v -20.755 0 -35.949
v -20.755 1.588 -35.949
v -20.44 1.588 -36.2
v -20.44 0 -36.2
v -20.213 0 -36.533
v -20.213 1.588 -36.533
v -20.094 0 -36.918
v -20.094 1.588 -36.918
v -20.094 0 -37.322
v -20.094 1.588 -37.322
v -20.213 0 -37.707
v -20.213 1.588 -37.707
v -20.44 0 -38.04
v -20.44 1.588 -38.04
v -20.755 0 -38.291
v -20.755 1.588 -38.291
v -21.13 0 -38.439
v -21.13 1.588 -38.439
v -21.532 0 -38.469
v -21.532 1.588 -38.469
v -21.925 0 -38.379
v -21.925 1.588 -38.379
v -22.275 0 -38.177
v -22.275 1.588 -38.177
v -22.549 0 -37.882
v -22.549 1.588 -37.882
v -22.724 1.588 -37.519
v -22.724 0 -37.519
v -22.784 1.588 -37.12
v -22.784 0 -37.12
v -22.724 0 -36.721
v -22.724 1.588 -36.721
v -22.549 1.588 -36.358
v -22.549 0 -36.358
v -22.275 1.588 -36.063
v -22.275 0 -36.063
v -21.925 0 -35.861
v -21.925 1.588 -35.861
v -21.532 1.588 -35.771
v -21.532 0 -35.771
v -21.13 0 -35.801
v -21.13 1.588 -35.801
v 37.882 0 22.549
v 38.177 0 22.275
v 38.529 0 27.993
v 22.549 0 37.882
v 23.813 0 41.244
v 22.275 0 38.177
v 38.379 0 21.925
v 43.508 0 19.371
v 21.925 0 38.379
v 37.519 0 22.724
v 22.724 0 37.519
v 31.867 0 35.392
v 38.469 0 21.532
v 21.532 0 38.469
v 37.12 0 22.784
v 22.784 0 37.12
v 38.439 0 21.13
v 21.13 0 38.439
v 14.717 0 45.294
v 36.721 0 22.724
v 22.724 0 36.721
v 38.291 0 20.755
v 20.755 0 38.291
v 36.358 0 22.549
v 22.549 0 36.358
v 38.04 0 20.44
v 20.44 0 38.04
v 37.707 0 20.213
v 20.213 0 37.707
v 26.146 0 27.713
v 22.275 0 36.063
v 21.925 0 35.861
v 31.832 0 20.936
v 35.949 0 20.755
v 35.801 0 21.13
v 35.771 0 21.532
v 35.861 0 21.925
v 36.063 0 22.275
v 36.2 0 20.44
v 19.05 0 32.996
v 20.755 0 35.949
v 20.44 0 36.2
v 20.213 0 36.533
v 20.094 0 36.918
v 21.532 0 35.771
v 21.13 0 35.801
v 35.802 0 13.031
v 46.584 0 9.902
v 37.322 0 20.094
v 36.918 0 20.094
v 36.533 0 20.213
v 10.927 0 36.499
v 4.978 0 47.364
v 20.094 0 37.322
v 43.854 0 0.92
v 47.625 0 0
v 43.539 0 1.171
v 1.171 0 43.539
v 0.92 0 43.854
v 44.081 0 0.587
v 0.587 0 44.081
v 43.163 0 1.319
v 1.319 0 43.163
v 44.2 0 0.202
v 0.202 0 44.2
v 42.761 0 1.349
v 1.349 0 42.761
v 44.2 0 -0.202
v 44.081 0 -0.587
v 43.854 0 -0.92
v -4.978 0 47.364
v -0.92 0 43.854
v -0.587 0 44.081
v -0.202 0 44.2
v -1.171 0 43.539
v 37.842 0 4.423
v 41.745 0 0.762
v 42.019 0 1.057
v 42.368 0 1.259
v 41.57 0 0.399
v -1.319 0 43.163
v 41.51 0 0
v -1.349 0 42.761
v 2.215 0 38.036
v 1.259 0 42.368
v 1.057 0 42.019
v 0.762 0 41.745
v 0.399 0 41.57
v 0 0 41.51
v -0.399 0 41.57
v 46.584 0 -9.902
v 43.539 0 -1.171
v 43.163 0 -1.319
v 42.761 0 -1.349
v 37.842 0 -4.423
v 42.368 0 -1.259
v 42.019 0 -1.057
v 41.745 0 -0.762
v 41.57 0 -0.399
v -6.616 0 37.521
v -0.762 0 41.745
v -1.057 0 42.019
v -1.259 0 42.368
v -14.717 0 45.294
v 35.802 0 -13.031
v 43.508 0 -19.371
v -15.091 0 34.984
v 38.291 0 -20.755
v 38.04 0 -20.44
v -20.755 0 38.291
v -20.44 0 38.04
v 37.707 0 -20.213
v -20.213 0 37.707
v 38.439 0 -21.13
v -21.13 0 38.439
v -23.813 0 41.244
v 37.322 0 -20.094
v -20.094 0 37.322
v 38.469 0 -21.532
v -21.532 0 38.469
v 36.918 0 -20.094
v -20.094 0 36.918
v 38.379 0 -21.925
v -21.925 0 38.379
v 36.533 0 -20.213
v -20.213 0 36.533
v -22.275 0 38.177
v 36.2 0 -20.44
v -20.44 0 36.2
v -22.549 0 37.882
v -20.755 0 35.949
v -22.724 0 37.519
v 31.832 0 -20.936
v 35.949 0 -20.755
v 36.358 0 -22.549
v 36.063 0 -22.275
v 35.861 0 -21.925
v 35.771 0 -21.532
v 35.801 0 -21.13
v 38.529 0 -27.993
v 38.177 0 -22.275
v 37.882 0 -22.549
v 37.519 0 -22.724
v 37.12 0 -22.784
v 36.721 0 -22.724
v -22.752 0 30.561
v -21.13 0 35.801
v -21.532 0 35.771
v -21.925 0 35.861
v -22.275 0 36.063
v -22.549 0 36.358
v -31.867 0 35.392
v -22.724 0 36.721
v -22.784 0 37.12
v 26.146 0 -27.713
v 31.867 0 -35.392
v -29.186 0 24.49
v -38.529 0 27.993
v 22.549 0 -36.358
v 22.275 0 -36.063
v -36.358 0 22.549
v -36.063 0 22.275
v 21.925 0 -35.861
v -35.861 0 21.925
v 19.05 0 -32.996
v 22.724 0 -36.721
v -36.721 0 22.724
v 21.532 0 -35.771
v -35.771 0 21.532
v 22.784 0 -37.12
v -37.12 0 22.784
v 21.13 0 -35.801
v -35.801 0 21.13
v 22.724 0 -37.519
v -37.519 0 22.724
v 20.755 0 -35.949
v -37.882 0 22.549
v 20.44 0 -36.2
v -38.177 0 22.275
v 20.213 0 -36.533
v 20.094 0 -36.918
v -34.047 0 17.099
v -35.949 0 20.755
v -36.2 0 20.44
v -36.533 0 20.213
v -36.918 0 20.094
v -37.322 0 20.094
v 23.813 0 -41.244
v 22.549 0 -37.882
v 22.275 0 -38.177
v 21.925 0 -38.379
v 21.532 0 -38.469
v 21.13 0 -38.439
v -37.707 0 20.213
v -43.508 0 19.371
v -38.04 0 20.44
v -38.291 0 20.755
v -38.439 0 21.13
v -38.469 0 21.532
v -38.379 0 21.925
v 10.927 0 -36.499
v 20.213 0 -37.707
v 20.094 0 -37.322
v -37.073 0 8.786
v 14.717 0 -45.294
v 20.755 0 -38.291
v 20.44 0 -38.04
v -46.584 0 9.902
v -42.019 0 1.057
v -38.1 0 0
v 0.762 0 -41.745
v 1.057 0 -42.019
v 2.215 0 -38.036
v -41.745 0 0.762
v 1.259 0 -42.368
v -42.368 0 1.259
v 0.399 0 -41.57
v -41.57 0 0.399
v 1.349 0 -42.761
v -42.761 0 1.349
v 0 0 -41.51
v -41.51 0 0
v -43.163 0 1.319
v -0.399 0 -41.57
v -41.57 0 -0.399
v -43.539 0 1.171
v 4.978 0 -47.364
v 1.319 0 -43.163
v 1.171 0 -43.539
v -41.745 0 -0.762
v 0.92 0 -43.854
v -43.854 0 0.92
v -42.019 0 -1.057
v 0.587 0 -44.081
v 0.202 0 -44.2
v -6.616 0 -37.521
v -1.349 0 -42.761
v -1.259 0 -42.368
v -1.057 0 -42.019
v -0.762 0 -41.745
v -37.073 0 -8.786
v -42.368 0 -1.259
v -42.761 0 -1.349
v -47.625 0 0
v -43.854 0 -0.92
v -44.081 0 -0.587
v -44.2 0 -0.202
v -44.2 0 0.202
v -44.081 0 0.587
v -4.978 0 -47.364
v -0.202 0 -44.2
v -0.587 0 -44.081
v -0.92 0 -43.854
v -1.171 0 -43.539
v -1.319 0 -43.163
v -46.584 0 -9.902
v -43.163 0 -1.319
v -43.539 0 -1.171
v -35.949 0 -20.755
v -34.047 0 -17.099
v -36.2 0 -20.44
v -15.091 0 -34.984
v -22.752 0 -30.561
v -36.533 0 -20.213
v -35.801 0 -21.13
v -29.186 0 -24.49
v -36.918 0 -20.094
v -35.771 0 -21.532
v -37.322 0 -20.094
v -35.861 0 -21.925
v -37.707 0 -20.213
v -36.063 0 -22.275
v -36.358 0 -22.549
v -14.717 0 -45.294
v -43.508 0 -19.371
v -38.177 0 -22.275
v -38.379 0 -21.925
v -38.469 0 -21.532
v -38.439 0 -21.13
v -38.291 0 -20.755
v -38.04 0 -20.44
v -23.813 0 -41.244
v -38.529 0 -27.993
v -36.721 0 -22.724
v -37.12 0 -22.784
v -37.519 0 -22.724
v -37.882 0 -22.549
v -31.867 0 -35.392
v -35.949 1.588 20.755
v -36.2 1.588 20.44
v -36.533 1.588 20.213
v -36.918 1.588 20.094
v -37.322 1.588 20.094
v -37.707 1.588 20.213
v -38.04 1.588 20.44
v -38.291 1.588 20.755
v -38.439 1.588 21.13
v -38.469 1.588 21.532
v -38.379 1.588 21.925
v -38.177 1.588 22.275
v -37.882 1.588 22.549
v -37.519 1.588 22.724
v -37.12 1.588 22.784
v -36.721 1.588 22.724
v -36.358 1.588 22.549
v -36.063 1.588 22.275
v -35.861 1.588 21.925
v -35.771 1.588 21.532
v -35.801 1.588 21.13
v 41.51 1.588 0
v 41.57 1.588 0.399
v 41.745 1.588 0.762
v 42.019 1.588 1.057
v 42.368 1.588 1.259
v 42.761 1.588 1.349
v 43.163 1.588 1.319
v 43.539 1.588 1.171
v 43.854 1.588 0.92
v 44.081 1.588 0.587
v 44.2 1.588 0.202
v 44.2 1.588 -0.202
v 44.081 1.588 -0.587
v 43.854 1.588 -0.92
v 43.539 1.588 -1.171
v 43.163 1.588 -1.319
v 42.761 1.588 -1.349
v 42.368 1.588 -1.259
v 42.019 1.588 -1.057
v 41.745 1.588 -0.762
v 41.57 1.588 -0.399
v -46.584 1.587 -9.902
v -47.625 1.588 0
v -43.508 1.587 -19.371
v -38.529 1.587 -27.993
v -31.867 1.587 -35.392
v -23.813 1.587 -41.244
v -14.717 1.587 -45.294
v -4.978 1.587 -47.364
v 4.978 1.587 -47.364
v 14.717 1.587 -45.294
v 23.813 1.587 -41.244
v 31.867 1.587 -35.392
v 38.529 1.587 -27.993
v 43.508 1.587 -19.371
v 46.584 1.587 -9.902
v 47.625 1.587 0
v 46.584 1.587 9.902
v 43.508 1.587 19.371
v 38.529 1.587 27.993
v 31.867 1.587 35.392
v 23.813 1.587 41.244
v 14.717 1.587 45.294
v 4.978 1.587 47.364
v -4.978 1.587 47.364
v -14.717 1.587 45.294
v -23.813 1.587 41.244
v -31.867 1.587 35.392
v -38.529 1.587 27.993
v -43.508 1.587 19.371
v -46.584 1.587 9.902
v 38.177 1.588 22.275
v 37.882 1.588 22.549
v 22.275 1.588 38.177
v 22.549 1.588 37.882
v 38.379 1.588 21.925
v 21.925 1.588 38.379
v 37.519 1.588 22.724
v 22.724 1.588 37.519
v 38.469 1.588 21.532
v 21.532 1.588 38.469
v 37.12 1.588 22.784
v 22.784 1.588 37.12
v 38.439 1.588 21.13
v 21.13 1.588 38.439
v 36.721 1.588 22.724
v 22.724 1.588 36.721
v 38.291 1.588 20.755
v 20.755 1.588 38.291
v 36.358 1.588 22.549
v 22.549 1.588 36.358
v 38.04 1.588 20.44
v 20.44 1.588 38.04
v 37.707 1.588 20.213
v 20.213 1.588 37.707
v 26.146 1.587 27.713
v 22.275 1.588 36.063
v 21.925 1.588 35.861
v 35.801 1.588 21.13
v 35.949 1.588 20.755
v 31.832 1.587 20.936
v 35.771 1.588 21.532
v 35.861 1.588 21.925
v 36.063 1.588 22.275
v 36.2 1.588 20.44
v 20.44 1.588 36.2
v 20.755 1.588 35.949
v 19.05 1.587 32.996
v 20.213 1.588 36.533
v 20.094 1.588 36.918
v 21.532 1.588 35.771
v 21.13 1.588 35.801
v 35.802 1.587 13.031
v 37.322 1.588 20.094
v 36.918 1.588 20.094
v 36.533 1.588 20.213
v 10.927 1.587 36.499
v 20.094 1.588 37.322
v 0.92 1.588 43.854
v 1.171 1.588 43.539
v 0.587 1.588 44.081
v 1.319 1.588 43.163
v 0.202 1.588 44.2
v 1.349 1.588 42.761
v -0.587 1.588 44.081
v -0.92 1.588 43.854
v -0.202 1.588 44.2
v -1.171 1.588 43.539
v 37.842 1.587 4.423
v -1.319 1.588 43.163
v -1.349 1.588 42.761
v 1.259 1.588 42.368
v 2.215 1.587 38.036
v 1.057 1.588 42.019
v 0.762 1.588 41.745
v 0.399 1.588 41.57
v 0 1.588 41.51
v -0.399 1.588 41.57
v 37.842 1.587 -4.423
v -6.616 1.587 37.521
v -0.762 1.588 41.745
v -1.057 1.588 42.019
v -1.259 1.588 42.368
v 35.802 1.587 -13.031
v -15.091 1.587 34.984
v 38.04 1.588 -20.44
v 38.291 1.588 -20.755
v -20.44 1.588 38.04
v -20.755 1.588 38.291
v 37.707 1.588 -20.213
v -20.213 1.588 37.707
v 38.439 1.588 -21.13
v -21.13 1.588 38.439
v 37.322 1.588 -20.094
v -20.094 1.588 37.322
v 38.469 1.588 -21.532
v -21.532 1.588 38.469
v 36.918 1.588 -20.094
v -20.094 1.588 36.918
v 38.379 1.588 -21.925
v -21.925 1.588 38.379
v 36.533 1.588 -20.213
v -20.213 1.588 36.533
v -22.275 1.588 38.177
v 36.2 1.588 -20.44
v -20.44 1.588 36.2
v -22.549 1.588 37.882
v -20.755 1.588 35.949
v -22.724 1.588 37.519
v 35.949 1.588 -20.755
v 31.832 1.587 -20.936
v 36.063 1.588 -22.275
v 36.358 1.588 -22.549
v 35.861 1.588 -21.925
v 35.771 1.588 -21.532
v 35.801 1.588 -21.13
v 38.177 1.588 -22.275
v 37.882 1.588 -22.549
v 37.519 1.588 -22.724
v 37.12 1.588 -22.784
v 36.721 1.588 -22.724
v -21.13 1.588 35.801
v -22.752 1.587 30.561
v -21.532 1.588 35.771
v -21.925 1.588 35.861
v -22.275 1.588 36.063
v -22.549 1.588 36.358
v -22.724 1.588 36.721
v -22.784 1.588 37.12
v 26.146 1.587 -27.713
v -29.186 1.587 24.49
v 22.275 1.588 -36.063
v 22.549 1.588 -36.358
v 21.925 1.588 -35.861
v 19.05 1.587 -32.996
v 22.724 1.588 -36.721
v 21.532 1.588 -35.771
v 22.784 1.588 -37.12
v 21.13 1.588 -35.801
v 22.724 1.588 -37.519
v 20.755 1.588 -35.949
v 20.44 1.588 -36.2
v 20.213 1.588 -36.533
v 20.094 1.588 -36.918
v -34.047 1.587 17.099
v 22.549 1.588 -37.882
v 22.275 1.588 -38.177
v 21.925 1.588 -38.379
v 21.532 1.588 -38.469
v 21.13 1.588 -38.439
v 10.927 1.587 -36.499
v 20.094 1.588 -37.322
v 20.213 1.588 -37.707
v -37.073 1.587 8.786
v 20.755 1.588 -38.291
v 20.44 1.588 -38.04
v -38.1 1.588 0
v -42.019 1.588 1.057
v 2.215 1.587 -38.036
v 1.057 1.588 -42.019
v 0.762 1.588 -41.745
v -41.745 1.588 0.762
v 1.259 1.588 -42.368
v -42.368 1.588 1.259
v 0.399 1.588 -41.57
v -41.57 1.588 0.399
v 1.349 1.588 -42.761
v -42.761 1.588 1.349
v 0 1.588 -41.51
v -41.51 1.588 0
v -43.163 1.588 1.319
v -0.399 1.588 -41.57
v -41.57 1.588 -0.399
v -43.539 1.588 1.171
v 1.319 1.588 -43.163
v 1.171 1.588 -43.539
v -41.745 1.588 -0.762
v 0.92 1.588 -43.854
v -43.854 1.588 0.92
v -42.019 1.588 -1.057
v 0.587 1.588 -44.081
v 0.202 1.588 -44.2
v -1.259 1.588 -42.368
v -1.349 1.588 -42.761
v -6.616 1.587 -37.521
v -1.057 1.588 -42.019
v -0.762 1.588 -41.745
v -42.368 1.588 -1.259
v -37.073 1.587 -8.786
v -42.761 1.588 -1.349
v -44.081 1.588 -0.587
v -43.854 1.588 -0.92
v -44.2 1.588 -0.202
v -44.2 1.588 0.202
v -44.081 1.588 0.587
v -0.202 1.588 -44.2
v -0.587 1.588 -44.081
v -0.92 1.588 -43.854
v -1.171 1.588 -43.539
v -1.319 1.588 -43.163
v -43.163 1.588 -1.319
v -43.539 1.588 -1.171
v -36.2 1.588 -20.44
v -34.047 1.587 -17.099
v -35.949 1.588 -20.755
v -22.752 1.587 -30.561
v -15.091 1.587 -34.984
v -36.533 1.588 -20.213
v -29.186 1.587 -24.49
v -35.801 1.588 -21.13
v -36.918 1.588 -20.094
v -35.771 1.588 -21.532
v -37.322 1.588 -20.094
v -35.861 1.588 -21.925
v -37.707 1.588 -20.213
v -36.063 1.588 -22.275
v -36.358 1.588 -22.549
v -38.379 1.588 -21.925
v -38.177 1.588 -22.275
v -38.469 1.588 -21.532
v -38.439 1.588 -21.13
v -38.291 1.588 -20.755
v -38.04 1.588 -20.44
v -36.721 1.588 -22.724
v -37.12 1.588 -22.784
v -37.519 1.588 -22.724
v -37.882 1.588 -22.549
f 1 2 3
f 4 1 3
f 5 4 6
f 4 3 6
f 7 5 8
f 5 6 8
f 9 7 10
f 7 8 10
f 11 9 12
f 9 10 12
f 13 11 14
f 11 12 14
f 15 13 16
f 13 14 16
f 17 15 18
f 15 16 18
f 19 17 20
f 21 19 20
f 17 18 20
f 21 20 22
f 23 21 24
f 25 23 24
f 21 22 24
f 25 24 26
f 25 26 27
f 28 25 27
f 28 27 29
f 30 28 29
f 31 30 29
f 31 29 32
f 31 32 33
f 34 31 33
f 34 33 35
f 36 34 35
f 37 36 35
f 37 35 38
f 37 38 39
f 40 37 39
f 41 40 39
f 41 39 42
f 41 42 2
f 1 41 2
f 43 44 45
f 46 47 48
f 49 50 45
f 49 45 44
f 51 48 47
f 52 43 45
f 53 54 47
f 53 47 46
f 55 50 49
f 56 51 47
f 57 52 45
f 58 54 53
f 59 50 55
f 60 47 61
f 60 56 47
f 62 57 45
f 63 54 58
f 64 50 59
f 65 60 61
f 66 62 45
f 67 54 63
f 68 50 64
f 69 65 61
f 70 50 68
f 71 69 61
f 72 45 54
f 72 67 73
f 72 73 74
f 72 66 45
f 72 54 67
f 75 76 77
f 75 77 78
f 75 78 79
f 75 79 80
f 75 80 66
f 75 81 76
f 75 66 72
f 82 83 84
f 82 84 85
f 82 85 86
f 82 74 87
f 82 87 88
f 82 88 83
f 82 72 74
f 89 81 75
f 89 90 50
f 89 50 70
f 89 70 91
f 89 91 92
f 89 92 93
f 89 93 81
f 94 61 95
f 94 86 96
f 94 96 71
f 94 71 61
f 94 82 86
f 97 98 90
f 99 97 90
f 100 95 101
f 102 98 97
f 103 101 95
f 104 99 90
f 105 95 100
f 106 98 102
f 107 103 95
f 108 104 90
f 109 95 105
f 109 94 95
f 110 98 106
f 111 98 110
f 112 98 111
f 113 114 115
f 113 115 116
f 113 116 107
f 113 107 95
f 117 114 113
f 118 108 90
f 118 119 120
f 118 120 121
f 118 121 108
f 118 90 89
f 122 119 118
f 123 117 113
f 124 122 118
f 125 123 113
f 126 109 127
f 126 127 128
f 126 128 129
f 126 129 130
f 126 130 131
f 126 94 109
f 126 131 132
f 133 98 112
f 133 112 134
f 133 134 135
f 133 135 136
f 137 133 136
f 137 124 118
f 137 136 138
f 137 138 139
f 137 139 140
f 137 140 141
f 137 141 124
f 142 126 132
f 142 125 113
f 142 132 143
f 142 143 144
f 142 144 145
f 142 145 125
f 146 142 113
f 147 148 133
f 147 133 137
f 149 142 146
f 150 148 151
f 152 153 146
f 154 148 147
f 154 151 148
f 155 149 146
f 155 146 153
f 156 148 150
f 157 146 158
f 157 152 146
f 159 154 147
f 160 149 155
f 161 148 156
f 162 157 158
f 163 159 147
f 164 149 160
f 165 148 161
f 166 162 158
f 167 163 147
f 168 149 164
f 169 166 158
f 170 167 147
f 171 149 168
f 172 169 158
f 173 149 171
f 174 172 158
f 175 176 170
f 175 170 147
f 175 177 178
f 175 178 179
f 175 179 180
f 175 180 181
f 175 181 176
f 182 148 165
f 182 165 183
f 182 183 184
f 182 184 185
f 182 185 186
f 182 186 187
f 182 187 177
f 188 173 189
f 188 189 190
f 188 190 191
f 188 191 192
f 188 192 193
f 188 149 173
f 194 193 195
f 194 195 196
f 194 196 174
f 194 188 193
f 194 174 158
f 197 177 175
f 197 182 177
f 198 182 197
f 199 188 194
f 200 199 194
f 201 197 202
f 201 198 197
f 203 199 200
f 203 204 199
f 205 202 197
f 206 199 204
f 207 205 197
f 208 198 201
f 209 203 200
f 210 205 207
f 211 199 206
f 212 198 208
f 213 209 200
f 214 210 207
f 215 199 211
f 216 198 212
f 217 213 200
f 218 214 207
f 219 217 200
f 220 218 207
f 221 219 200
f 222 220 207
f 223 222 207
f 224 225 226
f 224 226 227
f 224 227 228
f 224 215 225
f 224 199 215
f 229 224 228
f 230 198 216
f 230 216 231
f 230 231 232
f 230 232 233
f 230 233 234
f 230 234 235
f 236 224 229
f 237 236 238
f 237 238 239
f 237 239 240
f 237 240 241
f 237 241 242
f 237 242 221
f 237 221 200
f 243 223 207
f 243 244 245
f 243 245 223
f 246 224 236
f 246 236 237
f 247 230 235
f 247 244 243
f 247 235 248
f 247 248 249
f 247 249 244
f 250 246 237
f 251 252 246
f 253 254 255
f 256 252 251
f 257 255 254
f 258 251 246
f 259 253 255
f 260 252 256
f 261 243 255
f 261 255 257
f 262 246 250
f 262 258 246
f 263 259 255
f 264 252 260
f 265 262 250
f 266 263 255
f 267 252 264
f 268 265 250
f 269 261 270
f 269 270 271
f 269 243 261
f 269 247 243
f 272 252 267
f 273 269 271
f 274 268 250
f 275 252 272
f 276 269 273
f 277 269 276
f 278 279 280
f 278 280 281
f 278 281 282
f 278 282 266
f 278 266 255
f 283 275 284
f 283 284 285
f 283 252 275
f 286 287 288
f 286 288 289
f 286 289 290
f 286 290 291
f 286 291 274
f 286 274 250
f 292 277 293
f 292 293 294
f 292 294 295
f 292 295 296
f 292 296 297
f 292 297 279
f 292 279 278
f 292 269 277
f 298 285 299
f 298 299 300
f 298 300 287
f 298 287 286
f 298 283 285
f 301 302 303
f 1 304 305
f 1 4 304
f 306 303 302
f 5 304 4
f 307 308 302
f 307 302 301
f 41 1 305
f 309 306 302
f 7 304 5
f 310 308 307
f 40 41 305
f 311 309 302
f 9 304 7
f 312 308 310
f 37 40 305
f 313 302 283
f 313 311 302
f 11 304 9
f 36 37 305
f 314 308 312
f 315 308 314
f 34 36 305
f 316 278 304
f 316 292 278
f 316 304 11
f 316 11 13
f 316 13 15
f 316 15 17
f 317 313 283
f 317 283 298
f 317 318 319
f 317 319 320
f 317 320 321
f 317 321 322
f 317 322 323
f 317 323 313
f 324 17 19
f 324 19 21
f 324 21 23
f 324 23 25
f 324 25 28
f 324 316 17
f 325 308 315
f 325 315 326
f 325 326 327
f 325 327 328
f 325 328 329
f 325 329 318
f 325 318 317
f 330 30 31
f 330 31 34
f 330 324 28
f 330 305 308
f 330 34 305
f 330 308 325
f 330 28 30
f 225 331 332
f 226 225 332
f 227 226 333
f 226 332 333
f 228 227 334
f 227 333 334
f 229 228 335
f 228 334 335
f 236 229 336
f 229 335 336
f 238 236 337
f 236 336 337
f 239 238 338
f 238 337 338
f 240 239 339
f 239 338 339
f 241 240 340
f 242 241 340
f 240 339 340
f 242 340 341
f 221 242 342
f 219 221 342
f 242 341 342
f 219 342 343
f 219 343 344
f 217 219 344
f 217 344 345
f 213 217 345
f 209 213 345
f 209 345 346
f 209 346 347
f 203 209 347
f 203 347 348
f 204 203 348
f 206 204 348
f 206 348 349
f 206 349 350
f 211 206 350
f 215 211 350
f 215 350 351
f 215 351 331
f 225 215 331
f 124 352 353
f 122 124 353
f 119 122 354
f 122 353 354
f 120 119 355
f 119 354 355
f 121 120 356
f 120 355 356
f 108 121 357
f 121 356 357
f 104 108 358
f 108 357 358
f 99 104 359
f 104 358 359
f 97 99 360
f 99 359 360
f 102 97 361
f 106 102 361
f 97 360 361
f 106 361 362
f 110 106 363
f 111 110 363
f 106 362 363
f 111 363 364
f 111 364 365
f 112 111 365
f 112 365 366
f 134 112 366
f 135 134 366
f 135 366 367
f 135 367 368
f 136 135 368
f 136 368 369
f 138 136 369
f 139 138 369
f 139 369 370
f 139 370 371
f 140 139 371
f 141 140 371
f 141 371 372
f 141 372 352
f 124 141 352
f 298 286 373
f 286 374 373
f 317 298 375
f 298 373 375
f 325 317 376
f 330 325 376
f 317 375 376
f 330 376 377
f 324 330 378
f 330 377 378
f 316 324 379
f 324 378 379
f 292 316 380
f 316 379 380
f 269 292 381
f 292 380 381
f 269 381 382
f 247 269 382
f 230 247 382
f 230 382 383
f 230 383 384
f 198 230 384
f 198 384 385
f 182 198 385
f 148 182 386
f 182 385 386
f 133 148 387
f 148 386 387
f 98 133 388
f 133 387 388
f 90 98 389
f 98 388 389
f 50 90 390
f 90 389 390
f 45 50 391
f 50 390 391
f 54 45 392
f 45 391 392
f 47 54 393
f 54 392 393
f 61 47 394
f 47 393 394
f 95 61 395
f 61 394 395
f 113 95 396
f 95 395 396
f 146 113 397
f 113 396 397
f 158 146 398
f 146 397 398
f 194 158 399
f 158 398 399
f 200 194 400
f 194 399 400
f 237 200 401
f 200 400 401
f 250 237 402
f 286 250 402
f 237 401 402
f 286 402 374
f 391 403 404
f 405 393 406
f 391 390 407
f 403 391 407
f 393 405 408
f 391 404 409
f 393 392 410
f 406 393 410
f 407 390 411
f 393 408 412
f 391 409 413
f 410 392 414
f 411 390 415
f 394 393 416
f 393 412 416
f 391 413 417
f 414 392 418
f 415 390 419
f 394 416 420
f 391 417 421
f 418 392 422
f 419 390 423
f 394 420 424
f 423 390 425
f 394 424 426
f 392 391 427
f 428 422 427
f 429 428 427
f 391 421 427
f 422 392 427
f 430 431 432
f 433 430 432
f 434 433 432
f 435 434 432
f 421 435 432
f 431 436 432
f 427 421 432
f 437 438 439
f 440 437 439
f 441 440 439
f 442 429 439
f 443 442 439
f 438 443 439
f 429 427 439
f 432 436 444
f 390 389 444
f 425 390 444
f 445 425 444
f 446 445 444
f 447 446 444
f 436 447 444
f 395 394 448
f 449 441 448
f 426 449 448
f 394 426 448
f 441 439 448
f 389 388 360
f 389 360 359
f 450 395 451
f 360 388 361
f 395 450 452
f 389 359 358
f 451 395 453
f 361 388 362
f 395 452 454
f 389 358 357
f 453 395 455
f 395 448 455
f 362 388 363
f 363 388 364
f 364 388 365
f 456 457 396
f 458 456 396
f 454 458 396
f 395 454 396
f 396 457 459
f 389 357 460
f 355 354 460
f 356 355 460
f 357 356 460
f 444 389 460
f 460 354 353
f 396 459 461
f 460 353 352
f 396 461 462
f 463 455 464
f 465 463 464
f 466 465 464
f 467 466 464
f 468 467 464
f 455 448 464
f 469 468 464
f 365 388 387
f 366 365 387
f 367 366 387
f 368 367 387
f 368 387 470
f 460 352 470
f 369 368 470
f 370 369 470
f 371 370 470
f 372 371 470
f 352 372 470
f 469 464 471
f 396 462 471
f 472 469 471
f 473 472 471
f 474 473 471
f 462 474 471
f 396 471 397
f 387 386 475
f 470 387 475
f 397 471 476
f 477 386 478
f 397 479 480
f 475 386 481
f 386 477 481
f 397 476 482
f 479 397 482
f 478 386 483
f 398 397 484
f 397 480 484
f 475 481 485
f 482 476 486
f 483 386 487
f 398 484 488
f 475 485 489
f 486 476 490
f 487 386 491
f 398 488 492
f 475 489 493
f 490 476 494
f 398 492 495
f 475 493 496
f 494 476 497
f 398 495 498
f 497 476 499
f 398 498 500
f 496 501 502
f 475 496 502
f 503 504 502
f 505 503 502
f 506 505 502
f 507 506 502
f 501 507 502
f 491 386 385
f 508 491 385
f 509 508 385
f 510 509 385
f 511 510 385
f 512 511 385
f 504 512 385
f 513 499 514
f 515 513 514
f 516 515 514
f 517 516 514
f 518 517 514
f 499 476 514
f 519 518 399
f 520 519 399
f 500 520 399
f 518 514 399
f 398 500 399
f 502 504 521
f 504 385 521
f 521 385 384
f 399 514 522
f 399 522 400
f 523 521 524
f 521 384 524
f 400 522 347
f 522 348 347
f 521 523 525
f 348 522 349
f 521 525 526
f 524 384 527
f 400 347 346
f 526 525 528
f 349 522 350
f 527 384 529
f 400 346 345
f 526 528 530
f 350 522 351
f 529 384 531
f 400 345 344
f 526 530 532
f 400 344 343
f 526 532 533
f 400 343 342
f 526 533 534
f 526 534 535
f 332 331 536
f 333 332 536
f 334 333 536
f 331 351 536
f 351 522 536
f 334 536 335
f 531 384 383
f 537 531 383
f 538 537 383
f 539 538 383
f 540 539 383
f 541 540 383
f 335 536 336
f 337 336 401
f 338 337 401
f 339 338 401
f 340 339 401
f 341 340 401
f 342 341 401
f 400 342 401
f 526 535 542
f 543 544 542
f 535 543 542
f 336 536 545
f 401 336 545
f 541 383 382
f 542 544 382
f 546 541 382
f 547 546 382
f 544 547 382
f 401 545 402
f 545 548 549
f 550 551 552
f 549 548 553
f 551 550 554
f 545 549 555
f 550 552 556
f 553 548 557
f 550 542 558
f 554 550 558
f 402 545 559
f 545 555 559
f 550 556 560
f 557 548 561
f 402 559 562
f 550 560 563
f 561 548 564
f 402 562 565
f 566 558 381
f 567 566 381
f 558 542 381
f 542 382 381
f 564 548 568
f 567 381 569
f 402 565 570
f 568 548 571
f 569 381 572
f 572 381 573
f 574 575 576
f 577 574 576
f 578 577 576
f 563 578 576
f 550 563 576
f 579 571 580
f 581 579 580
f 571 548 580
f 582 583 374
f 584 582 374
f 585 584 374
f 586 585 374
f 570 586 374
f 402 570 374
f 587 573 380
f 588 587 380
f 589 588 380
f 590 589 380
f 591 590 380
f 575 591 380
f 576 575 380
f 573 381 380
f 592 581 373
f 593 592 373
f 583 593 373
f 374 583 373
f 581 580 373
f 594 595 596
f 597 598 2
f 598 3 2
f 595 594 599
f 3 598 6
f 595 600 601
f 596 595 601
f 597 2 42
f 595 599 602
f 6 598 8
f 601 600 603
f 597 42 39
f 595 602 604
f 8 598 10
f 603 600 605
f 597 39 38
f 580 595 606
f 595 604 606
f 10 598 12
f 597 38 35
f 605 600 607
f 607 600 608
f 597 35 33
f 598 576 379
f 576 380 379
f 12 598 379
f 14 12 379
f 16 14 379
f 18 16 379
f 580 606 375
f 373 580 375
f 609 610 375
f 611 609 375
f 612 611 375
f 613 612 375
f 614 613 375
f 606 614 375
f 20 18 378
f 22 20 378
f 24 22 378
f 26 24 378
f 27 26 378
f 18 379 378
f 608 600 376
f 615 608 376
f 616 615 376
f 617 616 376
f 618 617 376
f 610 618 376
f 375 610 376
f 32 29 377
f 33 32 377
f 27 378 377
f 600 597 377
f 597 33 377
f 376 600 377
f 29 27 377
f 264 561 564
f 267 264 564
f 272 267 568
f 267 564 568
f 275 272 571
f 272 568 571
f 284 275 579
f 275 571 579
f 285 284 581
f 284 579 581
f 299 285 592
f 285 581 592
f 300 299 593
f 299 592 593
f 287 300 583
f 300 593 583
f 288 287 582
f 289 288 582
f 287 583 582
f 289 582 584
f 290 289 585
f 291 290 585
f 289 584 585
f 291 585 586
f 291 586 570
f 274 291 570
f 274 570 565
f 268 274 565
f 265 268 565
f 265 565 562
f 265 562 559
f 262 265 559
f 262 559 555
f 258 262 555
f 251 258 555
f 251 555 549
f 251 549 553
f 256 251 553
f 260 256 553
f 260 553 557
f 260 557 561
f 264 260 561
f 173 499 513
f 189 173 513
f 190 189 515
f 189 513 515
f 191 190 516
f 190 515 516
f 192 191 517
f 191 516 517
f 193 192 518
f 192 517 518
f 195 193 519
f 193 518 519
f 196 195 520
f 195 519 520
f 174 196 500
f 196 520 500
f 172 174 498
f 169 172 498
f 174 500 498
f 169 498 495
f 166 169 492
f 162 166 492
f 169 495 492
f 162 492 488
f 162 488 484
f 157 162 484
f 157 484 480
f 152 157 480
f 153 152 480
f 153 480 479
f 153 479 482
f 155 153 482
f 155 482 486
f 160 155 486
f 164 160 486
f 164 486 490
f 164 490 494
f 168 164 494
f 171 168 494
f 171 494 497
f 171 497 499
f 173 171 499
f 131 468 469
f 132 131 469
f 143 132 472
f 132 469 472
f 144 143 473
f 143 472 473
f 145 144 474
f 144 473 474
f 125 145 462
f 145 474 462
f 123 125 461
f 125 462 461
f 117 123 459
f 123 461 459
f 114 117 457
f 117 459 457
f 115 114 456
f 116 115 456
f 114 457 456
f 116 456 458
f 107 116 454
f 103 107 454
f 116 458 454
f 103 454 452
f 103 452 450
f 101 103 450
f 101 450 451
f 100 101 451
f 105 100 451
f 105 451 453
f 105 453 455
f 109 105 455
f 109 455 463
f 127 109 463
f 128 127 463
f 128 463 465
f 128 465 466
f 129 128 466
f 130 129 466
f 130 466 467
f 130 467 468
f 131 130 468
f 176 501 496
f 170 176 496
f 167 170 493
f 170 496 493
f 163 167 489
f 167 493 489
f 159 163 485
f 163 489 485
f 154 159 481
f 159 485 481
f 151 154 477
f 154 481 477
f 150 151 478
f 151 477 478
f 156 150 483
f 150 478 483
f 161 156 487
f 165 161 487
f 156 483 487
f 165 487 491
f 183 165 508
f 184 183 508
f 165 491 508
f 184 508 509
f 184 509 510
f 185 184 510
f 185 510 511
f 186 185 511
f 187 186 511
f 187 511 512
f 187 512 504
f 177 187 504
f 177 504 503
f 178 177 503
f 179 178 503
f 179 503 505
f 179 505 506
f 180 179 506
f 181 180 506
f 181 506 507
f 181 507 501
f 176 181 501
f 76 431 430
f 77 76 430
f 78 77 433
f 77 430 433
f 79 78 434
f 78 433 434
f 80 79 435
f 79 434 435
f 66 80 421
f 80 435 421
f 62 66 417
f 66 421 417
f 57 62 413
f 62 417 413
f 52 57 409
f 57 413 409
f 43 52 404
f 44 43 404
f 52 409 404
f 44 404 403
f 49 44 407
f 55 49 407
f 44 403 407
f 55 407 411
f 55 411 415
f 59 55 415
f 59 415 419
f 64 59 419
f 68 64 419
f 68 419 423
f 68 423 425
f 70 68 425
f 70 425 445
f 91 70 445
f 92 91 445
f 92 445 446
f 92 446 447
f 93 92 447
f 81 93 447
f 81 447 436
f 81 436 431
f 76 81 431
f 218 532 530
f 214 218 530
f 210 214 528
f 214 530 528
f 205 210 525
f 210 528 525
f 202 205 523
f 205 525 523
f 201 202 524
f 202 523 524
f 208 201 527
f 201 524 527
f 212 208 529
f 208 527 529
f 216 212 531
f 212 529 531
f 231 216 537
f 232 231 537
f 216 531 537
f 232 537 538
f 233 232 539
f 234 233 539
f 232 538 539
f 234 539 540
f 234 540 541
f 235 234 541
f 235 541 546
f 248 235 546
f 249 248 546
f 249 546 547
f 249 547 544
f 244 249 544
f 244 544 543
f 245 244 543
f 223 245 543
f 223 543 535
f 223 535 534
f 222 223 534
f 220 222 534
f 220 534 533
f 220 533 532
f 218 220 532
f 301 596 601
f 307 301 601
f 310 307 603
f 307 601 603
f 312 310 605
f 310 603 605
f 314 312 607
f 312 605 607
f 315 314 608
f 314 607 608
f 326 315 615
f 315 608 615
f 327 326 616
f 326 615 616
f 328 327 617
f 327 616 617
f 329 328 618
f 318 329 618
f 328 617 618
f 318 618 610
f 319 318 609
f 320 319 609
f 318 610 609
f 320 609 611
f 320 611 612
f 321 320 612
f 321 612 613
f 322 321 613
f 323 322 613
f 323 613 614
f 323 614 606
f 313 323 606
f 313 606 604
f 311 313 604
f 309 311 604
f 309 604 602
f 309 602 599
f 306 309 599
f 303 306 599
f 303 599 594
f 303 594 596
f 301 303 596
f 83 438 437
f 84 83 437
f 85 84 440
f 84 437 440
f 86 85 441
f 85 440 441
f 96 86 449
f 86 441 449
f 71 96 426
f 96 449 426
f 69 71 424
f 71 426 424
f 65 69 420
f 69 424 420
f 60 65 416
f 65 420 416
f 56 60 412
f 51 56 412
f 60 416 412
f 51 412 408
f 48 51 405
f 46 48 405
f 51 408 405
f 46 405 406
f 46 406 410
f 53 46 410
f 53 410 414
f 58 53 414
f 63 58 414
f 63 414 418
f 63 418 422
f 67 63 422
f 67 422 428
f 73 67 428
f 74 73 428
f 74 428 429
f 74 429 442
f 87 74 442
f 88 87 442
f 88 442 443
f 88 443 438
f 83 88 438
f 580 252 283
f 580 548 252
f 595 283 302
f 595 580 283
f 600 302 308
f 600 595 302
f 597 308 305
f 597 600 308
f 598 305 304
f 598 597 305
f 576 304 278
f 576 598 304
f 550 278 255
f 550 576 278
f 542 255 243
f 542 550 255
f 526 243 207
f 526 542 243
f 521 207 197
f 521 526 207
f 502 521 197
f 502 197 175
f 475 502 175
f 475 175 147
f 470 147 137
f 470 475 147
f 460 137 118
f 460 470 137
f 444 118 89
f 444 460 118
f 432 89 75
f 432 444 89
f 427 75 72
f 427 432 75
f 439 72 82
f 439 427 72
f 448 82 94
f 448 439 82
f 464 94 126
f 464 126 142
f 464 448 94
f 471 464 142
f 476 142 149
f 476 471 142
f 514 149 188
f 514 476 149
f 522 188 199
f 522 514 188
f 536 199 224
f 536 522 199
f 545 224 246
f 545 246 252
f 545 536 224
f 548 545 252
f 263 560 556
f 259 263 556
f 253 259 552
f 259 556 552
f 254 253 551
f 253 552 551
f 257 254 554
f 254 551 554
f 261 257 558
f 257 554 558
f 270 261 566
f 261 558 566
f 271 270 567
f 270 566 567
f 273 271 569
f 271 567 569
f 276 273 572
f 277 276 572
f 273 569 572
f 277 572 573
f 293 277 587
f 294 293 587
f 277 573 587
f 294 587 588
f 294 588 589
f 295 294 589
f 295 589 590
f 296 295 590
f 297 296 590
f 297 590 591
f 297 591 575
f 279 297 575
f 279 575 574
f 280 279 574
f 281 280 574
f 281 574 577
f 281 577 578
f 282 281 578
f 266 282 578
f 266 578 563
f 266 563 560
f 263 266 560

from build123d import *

# Parameters (mm, degrees)
SKETCH1_W                    = 9.525
SKETCH1_H                    = 1.5875
F_36_0_1065_DIAMETER_HOLE1_D = 2.7051
SCREW_PASSTHROUGHS_COUNT     = 12


with BuildPart() as part:
    # Sketch1 → Main (revolve)
    with BuildSketch(Plane.XY):
        with Locations((-42.8625, 0.79375)):
            Rectangle(SKETCH1_W, SKETCH1_H)
    revolve(axis=Axis((0, 55, 0), (0, -1, 0)))

    # #36 (0.1065) Diameter Hole1 (through all)
    with Locations(Plane(origin=(0, 0, 0), x_dir=(-1, 0, 0), z_dir=(0, -1, 0))):
        with Locations((42.8625, 0)):
            f_36_0_1065_diameter_hole1 = Hole(F_36_0_1065_DIAMETER_HOLE1_D / 2)

    # Screw Passthroughs: #36 (0.1065) Diameter Hole1 ×12 about axis
    screw_passthroughs_axis = Axis((0, 0, 0), (0, 1, 0))
    for i in range(1, SCREW_PASSTHROUGHS_COUNT):
        add(f_36_0_1065_diameter_hole1.rotate(screw_passthroughs_axis, i * 360 / SCREW_PASSTHROUGHS_COUNT), mode=Mode.SUBTRACT)


solid = part.part
